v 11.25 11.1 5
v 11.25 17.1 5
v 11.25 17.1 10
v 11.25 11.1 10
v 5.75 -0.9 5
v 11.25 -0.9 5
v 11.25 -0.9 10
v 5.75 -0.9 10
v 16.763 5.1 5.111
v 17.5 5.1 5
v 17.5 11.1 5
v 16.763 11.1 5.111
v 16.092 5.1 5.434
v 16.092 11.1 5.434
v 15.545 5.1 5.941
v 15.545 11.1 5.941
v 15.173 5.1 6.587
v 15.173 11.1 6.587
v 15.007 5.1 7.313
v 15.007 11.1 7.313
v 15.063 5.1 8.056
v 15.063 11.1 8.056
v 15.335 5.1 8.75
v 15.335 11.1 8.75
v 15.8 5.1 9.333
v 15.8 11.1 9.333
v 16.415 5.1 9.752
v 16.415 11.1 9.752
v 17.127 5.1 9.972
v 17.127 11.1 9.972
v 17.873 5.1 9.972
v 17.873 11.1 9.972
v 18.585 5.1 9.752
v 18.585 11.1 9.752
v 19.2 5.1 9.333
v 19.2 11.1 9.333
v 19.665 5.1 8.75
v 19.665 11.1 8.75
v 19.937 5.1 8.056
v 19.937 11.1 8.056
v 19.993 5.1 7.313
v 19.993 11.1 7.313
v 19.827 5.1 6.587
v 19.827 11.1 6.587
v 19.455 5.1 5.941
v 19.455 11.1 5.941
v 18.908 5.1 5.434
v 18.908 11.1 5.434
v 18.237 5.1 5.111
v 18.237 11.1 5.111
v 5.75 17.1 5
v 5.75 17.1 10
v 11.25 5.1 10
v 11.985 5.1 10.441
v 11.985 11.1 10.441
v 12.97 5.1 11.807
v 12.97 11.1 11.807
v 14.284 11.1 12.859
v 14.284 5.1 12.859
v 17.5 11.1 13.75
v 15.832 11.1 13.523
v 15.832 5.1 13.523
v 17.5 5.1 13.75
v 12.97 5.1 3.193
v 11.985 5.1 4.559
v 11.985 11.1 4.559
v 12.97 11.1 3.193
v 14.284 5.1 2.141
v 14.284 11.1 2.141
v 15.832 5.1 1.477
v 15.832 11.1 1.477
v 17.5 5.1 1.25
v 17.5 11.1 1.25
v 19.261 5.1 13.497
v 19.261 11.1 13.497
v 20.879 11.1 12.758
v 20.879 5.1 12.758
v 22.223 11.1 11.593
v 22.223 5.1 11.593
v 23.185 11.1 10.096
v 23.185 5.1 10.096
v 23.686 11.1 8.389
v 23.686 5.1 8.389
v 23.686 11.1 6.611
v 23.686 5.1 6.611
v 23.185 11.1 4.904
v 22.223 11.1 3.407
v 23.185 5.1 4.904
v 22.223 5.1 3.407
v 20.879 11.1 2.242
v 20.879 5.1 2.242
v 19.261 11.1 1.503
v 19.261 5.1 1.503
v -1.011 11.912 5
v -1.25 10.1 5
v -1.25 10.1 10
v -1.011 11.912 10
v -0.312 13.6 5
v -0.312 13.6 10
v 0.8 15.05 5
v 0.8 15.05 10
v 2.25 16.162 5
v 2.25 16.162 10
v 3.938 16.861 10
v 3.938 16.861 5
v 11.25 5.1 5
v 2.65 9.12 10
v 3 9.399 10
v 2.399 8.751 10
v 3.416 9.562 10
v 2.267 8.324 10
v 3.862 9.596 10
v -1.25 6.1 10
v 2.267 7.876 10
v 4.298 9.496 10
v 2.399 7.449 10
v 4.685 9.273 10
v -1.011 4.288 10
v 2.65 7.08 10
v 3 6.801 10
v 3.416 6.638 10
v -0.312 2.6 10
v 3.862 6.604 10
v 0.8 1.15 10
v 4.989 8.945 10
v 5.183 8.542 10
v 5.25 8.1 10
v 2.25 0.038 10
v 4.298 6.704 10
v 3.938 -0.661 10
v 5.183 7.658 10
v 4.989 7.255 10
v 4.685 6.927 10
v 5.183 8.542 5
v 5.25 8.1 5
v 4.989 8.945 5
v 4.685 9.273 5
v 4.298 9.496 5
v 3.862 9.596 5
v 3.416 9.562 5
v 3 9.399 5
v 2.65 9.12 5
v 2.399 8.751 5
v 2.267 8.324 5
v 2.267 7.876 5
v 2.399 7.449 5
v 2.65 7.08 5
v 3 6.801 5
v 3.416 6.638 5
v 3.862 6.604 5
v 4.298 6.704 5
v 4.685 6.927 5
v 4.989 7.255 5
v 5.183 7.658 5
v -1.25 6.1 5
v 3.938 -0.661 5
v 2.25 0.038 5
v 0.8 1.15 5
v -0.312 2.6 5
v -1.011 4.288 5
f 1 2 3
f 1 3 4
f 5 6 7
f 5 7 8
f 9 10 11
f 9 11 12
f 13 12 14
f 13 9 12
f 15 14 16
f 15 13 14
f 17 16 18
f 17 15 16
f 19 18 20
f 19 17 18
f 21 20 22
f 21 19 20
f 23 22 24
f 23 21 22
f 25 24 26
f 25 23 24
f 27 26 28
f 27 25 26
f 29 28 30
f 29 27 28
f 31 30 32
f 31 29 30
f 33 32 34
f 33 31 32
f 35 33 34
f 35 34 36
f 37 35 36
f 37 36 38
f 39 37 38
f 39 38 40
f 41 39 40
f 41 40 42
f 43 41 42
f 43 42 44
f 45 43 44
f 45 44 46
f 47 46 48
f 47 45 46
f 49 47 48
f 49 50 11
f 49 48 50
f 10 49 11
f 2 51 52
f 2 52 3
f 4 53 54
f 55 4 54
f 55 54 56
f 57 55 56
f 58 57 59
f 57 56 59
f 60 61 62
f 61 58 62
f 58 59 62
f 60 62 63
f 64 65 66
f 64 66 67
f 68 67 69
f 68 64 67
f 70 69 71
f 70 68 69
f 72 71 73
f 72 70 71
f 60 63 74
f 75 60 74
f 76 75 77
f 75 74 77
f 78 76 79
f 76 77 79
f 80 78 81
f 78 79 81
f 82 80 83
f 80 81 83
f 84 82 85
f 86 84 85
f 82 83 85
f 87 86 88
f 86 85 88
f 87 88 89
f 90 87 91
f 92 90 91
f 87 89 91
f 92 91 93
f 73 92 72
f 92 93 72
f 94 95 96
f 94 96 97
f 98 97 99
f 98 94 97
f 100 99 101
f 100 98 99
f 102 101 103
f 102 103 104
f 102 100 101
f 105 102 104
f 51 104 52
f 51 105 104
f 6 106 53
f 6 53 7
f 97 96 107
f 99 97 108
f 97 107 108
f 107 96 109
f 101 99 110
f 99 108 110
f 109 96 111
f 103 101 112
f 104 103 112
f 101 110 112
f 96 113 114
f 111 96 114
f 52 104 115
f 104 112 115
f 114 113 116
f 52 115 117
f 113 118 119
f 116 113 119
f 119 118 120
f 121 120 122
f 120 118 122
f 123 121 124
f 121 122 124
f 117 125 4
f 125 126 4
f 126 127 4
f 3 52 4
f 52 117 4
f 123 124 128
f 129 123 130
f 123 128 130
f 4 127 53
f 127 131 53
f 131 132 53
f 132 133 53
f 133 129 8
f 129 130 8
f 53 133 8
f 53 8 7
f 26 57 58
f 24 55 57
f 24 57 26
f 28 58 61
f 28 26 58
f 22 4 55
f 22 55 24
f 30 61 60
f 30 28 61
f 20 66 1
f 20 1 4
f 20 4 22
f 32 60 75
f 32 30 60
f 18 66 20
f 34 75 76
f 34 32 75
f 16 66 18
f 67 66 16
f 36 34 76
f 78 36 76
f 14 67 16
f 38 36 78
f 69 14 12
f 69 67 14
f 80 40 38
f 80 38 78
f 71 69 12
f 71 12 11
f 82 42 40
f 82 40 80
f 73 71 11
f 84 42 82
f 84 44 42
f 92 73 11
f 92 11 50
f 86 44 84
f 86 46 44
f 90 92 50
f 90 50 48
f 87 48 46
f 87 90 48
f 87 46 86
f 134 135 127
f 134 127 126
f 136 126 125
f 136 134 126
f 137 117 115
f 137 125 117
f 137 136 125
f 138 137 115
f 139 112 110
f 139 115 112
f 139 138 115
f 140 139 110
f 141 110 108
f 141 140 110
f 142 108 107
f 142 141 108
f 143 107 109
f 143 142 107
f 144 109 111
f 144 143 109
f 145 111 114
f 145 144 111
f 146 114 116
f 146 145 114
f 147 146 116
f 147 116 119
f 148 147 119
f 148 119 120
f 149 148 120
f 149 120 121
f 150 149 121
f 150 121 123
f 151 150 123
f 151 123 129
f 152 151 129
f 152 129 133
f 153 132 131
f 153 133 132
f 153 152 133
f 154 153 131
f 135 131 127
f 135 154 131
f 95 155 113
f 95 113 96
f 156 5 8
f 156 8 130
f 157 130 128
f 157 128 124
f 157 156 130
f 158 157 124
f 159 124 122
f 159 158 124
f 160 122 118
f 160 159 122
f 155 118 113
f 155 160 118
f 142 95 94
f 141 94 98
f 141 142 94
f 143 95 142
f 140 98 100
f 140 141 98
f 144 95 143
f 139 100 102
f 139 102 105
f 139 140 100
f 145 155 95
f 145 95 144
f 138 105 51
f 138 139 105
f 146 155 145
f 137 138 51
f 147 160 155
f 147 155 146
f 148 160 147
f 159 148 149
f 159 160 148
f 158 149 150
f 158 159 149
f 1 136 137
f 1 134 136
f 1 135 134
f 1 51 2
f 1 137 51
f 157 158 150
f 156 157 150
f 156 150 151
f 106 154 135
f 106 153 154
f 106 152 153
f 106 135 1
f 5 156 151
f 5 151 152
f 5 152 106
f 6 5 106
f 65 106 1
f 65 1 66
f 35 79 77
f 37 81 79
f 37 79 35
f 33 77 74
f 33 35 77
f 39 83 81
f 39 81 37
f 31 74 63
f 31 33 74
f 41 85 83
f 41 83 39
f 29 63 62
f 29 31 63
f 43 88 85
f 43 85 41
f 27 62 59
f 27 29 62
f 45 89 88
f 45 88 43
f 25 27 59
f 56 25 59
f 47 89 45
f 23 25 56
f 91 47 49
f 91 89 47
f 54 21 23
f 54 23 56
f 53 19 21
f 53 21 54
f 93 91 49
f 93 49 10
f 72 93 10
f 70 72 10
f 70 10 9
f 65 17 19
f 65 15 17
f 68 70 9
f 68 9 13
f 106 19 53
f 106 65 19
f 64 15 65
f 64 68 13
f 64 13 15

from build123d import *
from build123d.topology import SkipClean

# Parameters (mm, degrees)
CROQUIS1_R              = 1.5
SALIENTE_EXTRUIR1_DEPTH = 15
CROQUIS2_R              = 2.5
CORTAR_EXTRUIR1_DEPTH   = 20
CORTAR_EXTRUIR2_START   = -22
CORTAR_EXTRUIR2_DEPTH   = 22


with BuildPart() as part:
    # Croquis1 → Saliente-Extruir1 (new body)
    with BuildSketch(Plane.XY):
        with BuildLine():
            Line((11.25, 17.1), (11.25, 11.1))
            Line((11.25, 11.1), (23.75, 11.1))
            Line((23.75, 11.1), (23.75, 5.1))
            Line((23.75, 5.1), (11.25, 5.1))
            Line((11.25, 5.1), (11.25, -0.9))
            Line((11.25, -0.9), (5.75, -0.9))
            ThreePointArc((5.75, -0.9), (0.800252532, 1.150252532), (-1.25, 6.1))
            Line((-1.25, 6.1), (-1.25, 10.1))
            ThreePointArc((-1.25, 10.1), (0.800252532, 15.049747468), (5.75, 17.1))
            Line((5.75, 17.1), (11.25, 17.1))
        make_face()
        with Locations((3.75, 8.1)):
            Circle(CROQUIS1_R, mode=Mode.SUBTRACT)
    extrude(amount=SALIENTE_EXTRUIR1_DEPTH)

    # Croquis2 → Cortar-Extruir1 (cut)
    with BuildSketch(Plane(origin=(0, 0, 0), x_dir=(1, 0, 0), z_dir=(0, 1, 0))):
        with Locations(Location((17.5, -7.5, 0), (0, 0, 90))):
            Circle(CROQUIS2_R)
        with BuildLine():
            Line((17.5, -1.25), (11.25, 0))
            Line((11.25, 0), (11.126279301, 1.868603497))
            Line((11.126279301, 1.868603497), (29.663453957, 1.868603497))
            Line((29.663453957, 1.868603497), (29.663453957, -17.961269996))
            Line((29.663453957, -17.961269996), (11.25, -17.961269996))
            Line((11.25, -17.961269996), (11.25, -15))
            Line((11.25, -15), (17.5, -13.75))
            ThreePointArc((17.5, -13.75), (23.75, -7.5), (17.5, -1.25))
        make_face()
    extrude(amount=CORTAR_EXTRUIR1_DEPTH, mode=Mode.SUBTRACT)

    # Croquis3 → Cortar-Extruir2 (cut)
    with SkipClean():  # the faces are left unmerged after this step: merging them gives an invalid solid
        with BuildSketch(Plane(origin=(0, 17.1, 0), x_dir=(1, 0, 0), z_dir=(0, 1, 0)).offset(CORTAR_EXTRUIR2_START)):
            with BuildLine():
                Line((-4.130088798, -10), (11.25, -10))
                Line((11.25, -10), (11.985294118, -10.441176471))
                ThreePointArc((11.985294118, -10.441176471), (14.284401529, -12.859330786), (17.5, -13.75))
                Line((17.5, -13.75), (17.5, -15.581395259))
                Line((17.5, -15.581395259), (-4.130088798, -15.581395259))
                Line((-4.130088798, -15.581395259), (-4.130088798, -10))
            make_face()
            with BuildLine():
                Line((-3.464792336, -5), (11.25, -5))
                Line((11.25, -5), (11.985294118, -4.558823529))
                ThreePointArc((11.985294118, -4.558823529), (14.284401529, -2.140669214), (17.5, -1.25))
                Line((17.5, -1.25), (17.5, 1.677177667))
                Line((17.5, 1.677177667), (-3.464792336, 1.677177667))
                Line((-3.464792336, 1.677177667), (-3.464792336, -5))
            make_face()
        extrude(amount=CORTAR_EXTRUIR2_DEPTH, mode=Mode.SUBTRACT)


solid = part.part
